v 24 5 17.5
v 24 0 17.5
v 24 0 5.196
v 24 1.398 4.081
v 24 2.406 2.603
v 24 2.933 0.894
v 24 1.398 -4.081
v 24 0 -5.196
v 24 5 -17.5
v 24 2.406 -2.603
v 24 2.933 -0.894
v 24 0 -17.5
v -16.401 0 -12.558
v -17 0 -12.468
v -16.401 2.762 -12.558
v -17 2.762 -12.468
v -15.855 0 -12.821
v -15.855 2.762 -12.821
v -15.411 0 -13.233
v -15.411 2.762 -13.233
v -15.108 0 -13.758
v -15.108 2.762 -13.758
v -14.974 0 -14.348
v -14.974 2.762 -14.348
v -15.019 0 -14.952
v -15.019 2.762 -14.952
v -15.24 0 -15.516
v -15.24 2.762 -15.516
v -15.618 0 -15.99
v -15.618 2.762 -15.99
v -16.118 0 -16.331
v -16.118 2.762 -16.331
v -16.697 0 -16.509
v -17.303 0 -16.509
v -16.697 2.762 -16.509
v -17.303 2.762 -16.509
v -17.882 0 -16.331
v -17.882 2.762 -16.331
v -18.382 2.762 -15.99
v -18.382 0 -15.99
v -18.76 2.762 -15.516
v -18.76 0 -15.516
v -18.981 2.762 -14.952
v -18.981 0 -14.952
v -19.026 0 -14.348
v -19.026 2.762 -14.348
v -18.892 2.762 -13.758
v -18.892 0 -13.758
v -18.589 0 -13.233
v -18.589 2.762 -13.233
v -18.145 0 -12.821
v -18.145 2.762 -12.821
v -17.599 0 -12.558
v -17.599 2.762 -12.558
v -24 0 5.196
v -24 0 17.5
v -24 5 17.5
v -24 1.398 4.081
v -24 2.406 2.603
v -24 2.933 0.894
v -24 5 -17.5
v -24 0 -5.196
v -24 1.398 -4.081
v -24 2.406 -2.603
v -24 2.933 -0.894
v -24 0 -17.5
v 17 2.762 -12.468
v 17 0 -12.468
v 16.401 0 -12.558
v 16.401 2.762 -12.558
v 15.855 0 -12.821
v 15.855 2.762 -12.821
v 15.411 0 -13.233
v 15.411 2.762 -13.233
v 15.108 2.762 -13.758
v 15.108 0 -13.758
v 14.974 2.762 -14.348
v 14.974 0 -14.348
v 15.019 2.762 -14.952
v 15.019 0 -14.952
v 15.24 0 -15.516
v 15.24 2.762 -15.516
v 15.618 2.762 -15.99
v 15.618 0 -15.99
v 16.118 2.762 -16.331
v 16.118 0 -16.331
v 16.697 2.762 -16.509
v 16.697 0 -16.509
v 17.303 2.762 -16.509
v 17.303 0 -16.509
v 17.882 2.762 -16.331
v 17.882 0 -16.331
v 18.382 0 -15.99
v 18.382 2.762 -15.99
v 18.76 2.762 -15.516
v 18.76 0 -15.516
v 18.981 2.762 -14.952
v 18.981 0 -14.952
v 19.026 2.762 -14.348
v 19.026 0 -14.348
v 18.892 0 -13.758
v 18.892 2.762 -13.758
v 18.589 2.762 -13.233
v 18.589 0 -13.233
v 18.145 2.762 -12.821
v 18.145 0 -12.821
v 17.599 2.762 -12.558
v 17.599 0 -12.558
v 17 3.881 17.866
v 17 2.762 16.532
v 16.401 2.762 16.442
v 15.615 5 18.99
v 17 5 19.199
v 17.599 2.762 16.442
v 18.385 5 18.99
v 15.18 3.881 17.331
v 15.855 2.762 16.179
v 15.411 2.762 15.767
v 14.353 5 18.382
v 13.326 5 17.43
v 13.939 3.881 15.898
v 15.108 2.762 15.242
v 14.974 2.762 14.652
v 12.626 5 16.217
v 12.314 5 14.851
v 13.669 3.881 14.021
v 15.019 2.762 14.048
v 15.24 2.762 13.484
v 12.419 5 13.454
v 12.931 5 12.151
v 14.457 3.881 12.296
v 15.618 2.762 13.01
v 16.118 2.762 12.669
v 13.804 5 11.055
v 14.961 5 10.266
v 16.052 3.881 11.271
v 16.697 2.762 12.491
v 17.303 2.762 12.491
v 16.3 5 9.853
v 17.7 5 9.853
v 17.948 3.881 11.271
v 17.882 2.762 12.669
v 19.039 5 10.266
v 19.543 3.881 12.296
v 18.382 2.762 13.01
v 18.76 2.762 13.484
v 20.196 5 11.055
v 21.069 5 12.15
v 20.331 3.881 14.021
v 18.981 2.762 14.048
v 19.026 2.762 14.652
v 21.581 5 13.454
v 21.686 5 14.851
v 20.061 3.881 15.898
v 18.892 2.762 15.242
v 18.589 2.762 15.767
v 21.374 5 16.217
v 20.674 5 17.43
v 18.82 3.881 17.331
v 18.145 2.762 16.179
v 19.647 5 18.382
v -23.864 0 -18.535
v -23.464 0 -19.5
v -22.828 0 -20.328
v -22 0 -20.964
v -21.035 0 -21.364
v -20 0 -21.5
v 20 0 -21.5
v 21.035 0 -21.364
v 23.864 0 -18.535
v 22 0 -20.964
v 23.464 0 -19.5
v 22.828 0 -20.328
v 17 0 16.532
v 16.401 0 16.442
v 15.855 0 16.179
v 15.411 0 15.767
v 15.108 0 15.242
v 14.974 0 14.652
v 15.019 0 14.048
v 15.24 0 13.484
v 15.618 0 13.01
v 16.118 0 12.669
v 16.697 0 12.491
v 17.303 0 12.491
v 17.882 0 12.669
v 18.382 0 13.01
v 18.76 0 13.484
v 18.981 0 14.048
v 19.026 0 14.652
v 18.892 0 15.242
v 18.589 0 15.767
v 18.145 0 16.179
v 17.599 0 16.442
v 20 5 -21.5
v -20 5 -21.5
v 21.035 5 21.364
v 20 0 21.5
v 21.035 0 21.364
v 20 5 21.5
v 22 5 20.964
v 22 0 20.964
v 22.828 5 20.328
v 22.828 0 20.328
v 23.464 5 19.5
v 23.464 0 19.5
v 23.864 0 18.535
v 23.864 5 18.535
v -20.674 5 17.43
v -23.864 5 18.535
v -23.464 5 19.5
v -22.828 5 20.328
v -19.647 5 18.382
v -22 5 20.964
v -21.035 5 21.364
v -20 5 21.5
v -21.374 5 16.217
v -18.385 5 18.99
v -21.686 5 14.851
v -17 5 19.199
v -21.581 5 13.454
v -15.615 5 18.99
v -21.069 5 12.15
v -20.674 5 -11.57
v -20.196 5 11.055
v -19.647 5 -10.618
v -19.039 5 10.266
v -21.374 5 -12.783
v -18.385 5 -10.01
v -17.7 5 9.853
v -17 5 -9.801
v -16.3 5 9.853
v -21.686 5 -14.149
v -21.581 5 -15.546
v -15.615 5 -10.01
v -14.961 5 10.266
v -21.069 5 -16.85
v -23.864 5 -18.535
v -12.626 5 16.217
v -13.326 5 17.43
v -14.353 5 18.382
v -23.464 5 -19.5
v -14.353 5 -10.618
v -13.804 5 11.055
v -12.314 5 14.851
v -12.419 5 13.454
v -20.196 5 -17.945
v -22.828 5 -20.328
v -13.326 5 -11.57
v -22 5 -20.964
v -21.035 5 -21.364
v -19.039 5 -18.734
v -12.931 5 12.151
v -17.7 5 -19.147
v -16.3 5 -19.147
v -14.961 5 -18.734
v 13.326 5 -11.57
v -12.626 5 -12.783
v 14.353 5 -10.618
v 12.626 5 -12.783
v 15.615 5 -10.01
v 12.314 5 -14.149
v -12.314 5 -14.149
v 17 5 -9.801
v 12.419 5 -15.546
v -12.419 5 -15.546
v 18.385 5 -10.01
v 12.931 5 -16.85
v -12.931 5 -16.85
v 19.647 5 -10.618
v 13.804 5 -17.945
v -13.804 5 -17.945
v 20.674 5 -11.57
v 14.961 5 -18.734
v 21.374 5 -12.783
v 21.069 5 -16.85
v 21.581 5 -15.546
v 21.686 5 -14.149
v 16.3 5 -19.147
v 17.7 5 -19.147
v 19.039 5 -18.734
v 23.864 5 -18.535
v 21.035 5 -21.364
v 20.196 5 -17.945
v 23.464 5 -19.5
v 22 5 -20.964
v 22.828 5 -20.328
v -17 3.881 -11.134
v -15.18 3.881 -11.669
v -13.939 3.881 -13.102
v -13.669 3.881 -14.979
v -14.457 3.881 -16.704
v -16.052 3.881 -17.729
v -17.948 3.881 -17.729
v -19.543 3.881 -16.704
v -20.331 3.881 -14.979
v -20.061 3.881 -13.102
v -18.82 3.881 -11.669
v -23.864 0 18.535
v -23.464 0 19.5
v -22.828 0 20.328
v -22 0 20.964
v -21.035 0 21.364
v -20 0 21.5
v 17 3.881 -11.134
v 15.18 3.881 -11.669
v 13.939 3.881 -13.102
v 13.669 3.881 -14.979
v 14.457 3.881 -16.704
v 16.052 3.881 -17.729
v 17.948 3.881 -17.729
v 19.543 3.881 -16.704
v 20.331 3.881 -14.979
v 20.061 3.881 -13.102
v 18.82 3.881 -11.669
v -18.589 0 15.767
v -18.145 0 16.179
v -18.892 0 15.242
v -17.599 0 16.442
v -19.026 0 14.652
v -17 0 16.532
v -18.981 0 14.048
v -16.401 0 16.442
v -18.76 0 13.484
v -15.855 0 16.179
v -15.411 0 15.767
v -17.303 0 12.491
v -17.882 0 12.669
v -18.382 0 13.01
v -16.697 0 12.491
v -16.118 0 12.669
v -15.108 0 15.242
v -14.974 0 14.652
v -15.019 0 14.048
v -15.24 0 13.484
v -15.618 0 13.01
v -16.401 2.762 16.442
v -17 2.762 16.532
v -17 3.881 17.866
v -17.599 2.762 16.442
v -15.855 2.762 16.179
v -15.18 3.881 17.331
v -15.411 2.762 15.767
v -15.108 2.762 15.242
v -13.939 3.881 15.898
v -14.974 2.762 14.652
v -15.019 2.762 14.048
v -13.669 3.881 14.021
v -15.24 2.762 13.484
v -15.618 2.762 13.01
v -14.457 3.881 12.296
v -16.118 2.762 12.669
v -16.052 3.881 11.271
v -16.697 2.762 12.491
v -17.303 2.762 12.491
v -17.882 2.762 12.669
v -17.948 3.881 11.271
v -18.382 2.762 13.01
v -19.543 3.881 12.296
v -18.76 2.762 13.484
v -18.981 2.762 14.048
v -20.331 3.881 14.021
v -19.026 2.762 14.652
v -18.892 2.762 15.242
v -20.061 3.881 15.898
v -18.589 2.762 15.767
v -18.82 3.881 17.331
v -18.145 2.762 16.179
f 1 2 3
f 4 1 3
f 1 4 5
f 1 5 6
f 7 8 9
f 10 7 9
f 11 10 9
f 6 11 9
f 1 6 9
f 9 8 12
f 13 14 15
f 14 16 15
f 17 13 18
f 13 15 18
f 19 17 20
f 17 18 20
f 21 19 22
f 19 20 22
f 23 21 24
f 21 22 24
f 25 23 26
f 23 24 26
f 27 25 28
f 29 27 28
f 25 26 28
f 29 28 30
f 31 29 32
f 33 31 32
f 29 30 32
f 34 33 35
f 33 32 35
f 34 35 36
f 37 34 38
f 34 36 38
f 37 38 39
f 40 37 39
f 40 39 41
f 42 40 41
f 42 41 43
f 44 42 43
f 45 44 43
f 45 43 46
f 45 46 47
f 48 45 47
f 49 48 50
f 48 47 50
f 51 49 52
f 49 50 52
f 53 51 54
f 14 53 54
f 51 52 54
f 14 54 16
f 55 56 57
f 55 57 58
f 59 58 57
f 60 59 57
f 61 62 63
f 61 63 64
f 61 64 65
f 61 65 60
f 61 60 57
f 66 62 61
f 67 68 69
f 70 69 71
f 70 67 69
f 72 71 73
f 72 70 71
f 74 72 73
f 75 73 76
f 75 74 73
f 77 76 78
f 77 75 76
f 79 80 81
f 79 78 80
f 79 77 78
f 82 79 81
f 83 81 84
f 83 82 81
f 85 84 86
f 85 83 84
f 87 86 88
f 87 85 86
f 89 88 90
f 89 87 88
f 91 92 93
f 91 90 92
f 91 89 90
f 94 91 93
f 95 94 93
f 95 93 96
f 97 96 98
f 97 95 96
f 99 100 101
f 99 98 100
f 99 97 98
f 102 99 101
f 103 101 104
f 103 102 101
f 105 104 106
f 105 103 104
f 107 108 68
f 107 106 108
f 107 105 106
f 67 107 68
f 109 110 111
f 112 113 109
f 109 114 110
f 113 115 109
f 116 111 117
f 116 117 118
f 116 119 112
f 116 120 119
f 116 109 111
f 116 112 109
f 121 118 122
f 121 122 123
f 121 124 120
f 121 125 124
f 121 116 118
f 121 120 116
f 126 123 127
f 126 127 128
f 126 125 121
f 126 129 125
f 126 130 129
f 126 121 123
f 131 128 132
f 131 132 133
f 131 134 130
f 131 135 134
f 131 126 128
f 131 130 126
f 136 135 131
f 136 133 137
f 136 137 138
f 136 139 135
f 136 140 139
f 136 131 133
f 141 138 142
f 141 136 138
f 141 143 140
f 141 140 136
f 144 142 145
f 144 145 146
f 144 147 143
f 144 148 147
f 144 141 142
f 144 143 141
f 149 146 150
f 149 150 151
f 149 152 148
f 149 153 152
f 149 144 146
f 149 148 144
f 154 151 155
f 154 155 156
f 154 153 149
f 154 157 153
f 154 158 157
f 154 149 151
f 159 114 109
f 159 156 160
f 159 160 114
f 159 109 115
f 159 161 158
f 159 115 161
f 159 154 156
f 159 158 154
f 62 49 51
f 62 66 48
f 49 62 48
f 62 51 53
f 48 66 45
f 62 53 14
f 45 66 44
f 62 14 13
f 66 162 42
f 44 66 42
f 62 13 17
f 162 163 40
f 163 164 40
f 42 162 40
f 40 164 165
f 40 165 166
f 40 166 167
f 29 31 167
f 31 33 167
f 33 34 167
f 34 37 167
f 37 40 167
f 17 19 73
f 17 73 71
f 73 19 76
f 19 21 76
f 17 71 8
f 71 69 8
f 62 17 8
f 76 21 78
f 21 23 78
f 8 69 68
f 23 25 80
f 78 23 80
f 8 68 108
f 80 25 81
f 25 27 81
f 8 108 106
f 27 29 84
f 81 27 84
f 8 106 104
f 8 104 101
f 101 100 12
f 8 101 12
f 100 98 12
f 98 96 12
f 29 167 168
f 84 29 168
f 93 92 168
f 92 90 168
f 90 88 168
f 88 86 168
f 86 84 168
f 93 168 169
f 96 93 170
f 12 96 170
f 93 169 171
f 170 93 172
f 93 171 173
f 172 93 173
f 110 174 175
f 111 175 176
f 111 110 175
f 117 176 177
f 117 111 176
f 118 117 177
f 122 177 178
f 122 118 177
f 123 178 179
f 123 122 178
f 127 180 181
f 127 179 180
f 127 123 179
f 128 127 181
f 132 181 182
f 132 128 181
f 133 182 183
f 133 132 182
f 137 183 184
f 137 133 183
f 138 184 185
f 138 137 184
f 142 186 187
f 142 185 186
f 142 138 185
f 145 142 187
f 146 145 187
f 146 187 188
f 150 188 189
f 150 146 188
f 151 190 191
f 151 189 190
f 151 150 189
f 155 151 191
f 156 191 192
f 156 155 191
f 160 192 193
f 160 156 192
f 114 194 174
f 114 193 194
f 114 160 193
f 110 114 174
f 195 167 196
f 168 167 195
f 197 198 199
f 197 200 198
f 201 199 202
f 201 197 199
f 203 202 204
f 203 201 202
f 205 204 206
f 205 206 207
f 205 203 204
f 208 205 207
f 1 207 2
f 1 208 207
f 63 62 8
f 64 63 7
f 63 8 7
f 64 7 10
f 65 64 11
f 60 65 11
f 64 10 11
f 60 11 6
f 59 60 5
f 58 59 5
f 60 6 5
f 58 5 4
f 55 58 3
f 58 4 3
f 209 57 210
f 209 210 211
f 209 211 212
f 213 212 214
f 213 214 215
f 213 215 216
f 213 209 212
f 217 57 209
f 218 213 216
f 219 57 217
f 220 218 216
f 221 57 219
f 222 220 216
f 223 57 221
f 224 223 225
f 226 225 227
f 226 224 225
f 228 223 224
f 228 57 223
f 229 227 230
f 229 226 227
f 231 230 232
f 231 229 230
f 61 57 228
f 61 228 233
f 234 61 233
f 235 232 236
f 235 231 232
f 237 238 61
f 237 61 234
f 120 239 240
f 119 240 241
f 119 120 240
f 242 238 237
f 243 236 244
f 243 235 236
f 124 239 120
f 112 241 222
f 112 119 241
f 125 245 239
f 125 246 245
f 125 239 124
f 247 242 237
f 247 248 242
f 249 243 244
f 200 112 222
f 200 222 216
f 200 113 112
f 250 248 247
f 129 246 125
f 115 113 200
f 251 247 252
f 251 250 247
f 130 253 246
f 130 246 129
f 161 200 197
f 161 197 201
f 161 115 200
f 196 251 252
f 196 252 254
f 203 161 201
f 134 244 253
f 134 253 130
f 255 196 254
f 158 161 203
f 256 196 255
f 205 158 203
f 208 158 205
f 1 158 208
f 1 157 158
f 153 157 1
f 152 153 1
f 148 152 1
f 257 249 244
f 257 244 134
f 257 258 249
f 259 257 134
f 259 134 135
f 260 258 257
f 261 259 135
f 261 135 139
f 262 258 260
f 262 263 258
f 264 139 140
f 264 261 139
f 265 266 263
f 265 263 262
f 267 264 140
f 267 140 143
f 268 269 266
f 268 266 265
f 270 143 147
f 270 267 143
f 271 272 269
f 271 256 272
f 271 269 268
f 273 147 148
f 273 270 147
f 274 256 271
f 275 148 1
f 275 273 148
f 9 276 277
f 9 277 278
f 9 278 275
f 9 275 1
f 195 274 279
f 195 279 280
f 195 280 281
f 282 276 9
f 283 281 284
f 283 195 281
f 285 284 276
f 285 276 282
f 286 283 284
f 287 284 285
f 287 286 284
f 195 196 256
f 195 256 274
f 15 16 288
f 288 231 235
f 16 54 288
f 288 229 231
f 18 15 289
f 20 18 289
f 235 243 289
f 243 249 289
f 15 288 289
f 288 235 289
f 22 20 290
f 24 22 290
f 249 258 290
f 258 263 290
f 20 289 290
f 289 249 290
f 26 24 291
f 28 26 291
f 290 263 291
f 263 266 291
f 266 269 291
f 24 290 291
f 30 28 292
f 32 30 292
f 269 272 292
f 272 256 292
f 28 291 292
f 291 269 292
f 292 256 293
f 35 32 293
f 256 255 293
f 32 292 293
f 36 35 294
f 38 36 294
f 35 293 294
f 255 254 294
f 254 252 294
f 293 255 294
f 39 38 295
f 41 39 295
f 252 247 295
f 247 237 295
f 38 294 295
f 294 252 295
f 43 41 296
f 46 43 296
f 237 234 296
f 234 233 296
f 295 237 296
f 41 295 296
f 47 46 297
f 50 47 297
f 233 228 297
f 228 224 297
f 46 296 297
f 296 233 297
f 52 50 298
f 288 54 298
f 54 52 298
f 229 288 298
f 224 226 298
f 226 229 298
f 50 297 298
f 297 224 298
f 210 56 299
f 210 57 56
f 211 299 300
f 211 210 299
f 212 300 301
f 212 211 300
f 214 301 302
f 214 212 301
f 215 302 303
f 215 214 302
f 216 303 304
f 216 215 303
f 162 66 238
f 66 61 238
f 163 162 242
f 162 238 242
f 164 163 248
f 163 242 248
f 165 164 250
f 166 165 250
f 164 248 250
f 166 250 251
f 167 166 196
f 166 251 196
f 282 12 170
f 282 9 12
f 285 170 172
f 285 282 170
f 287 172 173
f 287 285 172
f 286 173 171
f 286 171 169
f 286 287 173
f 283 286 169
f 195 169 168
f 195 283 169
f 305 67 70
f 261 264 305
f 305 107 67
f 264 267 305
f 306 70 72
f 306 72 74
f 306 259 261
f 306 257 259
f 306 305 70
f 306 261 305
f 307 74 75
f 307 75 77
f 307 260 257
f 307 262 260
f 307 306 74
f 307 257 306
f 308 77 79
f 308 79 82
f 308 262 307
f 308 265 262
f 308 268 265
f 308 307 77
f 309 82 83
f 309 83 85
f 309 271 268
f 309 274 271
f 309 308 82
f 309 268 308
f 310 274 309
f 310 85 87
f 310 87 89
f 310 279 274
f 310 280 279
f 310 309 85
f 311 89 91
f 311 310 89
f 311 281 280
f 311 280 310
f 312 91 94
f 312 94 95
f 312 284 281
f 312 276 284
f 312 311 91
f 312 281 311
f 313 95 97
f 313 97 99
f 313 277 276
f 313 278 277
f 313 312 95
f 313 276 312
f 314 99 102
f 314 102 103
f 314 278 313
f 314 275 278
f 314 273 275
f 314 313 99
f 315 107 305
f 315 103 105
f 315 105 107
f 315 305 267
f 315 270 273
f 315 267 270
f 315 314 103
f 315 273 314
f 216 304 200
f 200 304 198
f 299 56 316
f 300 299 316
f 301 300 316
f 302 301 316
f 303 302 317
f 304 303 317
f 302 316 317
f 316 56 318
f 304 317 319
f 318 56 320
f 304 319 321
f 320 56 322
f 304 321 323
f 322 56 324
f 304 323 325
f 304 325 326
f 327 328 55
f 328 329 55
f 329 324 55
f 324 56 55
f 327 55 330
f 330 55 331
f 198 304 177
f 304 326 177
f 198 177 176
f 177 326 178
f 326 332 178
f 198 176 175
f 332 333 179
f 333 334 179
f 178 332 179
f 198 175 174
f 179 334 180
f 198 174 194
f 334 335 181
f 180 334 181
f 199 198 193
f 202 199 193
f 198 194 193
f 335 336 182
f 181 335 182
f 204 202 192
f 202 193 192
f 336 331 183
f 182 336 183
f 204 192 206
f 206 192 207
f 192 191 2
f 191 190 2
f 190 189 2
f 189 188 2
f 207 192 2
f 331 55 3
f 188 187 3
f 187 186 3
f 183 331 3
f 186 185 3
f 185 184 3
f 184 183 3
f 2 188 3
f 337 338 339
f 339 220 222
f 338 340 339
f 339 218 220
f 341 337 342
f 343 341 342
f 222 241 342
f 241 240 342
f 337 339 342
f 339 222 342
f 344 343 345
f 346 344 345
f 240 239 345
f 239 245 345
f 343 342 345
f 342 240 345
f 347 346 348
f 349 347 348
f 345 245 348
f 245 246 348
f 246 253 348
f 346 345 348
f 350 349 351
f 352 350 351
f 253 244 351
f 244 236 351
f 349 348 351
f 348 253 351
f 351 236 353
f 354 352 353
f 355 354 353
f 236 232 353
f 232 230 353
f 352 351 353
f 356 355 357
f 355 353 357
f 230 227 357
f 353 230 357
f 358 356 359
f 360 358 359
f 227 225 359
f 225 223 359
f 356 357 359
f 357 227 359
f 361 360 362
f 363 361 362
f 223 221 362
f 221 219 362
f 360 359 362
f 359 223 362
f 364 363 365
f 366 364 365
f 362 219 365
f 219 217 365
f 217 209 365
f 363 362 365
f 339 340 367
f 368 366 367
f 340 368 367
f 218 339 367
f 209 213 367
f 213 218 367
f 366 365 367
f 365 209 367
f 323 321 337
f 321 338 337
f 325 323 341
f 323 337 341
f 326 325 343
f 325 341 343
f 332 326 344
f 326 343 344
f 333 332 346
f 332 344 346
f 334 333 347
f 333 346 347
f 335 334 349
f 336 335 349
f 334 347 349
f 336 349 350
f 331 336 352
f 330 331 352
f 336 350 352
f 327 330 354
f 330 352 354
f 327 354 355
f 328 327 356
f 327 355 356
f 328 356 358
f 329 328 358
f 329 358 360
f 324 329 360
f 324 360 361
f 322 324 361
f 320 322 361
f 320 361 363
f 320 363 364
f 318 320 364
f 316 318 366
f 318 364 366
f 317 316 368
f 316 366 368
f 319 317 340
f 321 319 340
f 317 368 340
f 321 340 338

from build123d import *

# Parameters (mm, degrees)
SKETCH1_W                                   = 48
SKETCH1_H                                   = 43
BOSS_EXTRUDE1_DEPTH                         = 5
FILLET1_R                                   = 4
CSK_FOR_1_4_FLAT_HEAD_MACHINE_SCREW_2_COUNT = 2
CSK_FOR_1_4_FLAT_HEAD_MACHINE_SCREW_2_PITCH = 29
CUT_EXTRUDE2_DEPTH                          = 55


with BuildPart() as part:
    # Sketch1 → Boss-Extrude1 (new body)
    with BuildSketch(Plane(origin=(0, 0, 0), x_dir=(1, 0, 0), z_dir=(0, 1, 0))):
        Rectangle(SKETCH1_W, SKETCH1_H)
    extrude(amount=BOSS_EXTRUDE1_DEPTH)

    # Fillet1
    fillet1_edges = [part.edges().sort_by_distance(p)[0] for p in [
        (24, 2.5, 21.5),
        (-24, 2.5, 21.5),
        (-24, 2.5, -21.5),
        (24, 2.5, -21.5),
    ]]
    fillet(fillet1_edges, radius=FILLET1_R)

    # Sketch3 → CSK for 1/4 Flat Head Machine Screw (100)1 (revolve, cut)
    with BuildSketch(Plane(origin=(17, 5, 14.5), x_dir=(0, 0, 1), z_dir=(1, 0, 0))):
        Polygon((0, 0), (0, 30), (2.032, 28.779051222), (2.032, 2.237878716), (4.699, 0), align=None)
    csk_for_1_4_flat_head_machine_screw_100 = revolve(axis=Axis((17, 11.35, 14.5), (0, -1, 0)), mode=Mode.SUBTRACT)

    # CSK for 1_4 Flat Head Machine Screw  2: CSK for 1/4 Flat Head Machine Screw (100)1 ×2
    with Locations(*[(0, 0, -i * CSK_FOR_1_4_FLAT_HEAD_MACHINE_SCREW_2_PITCH) for i in range(1, CSK_FOR_1_4_FLAT_HEAD_MACHINE_SCREW_2_COUNT)]):
        add(csk_for_1_4_flat_head_machine_screw_100, mode=Mode.SUBTRACT)

    # Mirror1: CSK for 1/4 Flat Head Machine Screw (100)1 across plane
    add(csk_for_1_4_flat_head_machine_screw_100.mirror(Plane(origin=(0, 0, 0), x_dir=(0, 0, 1), z_dir=(1, 0, 0))), mode=Mode.SUBTRACT)

    # Mirror1 copy 1 sketch → Mirror1 copy 1 (revolve, cut)
    with BuildSketch(Plane(origin=(-17, 5, -14.5), x_dir=(0, 0, 1), z_dir=(-1, 0, 0))):
        Polygon((0, 0), (0, -30), (2.032, -28.779051222), (2.032, -2.237878716), (4.699, 0), align=None)
    revolve(axis=Axis((-17, 11.35, -14.5), (0, 1, 0)), mode=Mode.SUBTRACT)

    # Sketch6 → Cut-Extrude2 (cut)
    with BuildSketch(Plane(origin=(24, 0, 0), x_dir=(0, 0, -1), z_dir=(1, 0, 0))):
        with BuildLine():
            Line((-5.196152423, 0), (5.196152423, 0))
            ThreePointArc((5.196152423, 0), (0, 3), (-5.196152423, 0))
        make_face()
    extrude(amount=-CUT_EXTRUDE2_DEPTH, mode=Mode.SUBTRACT)


solid = part.part
